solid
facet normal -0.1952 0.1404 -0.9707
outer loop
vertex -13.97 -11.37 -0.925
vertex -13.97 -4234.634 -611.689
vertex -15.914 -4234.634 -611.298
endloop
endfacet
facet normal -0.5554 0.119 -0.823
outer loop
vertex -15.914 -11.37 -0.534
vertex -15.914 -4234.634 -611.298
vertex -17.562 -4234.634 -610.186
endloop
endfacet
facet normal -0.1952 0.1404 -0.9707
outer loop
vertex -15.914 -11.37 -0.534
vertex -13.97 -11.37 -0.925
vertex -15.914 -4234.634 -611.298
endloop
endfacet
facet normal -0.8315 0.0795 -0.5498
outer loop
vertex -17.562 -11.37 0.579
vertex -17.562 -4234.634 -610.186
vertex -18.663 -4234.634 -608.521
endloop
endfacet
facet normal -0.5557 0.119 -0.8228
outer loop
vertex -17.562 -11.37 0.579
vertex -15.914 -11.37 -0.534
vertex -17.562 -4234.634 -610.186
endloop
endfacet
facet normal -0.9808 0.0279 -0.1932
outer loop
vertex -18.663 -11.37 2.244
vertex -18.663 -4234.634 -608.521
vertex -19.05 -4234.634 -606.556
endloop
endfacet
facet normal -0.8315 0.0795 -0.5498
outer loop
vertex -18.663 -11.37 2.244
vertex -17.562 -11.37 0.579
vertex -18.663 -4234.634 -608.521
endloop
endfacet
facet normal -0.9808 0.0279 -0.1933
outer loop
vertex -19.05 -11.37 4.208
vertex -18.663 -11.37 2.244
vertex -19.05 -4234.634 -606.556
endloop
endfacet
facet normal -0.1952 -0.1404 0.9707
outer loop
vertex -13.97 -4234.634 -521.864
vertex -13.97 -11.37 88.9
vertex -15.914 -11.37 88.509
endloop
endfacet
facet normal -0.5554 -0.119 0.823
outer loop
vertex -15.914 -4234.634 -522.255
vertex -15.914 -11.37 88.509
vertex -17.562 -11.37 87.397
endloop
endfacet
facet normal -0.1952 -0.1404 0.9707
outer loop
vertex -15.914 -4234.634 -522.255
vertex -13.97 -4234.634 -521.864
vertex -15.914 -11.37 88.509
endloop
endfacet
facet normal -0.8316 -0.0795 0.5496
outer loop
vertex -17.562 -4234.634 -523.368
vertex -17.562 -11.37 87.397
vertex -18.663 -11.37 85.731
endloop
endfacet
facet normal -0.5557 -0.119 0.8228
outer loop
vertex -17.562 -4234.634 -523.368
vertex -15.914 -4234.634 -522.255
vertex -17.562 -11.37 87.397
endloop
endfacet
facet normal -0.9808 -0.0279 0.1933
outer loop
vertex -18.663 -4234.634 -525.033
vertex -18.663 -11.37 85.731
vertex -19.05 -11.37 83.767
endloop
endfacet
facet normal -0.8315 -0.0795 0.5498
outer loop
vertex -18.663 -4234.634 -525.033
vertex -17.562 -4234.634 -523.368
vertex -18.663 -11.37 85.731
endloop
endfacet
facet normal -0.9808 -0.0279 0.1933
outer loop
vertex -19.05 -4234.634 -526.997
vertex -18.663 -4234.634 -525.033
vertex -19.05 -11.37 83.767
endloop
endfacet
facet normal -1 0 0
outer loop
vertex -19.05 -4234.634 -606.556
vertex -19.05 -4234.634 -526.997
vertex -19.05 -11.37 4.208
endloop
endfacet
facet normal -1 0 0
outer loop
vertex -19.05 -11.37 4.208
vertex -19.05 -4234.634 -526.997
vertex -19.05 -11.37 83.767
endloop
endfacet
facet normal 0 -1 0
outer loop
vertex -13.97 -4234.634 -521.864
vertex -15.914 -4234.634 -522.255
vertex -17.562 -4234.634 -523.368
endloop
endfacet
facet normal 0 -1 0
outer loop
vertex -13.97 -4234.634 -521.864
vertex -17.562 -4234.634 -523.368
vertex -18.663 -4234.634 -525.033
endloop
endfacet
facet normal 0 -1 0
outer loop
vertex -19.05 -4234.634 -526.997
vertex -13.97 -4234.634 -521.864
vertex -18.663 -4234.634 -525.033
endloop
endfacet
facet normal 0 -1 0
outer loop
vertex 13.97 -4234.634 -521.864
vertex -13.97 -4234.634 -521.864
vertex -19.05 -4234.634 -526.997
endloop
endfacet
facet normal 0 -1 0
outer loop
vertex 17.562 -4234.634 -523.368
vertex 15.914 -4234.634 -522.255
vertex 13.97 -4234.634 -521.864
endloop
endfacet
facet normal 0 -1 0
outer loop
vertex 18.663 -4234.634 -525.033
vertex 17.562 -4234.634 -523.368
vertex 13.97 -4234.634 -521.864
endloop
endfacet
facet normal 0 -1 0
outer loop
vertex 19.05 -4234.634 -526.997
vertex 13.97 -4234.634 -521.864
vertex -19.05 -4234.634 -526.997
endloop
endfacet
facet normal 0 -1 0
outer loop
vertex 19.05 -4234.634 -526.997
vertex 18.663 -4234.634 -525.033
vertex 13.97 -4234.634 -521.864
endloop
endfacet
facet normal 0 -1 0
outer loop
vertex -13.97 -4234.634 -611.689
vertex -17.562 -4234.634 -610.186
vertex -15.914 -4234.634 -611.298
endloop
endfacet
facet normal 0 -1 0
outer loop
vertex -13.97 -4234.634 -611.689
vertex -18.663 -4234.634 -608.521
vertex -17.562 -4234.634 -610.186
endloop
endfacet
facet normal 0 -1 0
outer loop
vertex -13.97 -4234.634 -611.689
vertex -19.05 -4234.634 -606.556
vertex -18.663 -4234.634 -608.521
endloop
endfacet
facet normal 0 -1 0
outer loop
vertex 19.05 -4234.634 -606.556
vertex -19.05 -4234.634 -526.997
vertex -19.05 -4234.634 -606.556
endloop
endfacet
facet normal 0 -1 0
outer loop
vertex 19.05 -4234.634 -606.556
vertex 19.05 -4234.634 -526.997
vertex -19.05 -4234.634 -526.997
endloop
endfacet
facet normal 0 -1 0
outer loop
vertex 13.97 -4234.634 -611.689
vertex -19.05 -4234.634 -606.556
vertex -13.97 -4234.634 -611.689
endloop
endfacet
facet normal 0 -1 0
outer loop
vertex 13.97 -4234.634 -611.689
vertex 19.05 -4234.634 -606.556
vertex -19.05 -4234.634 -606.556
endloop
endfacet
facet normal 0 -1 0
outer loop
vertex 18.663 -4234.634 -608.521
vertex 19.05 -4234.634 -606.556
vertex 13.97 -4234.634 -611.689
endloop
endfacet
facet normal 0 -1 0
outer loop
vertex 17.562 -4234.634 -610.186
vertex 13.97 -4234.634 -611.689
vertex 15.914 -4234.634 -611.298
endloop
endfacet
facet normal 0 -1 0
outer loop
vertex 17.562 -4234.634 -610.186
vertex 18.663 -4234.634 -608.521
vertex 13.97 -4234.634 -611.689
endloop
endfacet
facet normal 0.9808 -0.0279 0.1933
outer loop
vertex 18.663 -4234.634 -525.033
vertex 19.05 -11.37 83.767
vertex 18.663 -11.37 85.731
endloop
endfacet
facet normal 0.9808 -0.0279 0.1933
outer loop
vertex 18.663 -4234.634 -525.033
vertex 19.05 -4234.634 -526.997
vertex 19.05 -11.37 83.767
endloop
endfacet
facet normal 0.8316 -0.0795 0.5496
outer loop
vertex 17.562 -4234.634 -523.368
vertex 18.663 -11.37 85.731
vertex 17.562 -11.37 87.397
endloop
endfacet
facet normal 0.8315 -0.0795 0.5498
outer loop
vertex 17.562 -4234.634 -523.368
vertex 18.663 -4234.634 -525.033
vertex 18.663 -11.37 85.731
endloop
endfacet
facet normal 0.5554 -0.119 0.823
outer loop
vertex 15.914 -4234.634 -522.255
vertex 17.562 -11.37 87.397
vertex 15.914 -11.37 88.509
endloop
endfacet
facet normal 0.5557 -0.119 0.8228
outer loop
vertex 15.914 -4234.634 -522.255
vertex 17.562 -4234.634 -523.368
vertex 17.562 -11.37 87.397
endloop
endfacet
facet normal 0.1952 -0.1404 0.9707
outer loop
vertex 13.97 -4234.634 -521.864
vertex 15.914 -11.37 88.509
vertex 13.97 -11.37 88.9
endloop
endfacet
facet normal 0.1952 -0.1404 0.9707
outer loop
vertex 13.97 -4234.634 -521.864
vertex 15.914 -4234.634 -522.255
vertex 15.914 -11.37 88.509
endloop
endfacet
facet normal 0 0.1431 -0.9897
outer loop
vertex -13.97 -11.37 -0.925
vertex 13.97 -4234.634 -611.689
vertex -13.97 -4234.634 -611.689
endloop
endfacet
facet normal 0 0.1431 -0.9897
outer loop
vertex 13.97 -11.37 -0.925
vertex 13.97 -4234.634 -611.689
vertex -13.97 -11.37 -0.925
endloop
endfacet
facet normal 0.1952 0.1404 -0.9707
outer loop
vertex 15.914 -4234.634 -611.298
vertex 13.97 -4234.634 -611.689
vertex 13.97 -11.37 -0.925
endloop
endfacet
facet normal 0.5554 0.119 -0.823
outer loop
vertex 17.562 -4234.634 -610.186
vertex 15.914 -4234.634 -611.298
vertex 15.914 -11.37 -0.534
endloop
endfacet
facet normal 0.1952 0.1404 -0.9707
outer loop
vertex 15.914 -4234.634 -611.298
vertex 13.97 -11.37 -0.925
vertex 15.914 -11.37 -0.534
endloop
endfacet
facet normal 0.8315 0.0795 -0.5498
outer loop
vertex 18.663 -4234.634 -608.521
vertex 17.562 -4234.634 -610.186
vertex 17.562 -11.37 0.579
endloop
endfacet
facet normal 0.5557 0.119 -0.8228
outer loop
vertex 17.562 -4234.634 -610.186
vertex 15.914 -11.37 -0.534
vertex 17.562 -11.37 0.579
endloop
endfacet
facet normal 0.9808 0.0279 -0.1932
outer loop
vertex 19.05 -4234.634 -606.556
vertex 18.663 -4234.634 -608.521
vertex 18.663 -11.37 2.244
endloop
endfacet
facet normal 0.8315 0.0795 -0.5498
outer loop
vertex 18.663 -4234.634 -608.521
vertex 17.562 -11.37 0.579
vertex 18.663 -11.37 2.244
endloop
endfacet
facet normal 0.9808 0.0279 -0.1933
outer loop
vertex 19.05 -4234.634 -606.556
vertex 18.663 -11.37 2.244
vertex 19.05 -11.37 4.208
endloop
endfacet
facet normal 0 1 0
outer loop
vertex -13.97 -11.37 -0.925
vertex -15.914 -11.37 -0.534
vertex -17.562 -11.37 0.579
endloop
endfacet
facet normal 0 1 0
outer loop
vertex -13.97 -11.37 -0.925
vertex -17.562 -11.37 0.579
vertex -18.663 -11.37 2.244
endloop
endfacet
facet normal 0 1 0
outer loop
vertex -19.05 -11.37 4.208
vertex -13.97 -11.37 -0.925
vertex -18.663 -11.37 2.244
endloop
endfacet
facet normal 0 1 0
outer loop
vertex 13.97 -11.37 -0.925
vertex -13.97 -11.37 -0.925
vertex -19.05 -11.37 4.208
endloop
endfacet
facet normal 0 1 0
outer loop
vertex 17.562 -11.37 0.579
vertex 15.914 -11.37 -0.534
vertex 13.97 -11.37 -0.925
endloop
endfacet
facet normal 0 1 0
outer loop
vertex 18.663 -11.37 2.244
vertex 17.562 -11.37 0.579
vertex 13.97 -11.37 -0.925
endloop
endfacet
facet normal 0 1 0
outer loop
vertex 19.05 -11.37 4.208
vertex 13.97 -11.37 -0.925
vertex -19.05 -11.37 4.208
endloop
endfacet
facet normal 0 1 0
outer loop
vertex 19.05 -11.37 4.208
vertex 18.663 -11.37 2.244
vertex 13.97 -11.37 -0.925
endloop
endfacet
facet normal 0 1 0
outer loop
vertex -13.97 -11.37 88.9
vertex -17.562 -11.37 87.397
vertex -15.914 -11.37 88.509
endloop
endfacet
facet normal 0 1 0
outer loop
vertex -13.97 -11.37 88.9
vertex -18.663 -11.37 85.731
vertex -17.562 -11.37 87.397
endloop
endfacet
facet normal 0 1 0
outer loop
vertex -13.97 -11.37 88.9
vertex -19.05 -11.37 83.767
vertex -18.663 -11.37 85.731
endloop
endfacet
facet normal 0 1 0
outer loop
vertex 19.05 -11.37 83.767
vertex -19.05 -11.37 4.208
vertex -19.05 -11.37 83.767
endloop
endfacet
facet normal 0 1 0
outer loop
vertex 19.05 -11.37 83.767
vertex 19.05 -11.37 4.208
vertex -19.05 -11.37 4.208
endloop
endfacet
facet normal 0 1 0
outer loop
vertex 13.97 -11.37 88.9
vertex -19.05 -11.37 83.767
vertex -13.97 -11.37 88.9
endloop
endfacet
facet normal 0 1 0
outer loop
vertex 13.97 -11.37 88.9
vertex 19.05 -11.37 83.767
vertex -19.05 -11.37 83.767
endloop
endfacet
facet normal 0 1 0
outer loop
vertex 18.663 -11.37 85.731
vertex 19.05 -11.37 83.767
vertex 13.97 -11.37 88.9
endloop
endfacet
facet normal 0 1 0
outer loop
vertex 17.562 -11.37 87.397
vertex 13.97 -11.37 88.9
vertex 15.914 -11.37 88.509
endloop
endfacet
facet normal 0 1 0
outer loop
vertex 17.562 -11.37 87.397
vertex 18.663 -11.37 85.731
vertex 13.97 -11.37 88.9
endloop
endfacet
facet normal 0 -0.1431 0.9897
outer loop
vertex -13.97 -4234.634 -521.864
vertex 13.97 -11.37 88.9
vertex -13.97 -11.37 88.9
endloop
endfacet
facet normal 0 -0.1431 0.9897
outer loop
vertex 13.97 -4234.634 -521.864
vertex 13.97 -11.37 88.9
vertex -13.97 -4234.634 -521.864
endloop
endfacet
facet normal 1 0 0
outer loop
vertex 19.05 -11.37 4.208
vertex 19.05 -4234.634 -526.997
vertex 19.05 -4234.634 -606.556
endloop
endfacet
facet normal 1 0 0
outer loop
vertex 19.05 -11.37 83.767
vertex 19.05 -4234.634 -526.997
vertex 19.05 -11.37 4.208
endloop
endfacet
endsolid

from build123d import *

# Parameters (mm, degrees)
F1_DEPTH = 19.05
F2_R     = 5.08


with BuildPart() as f1:
    # F0 (on Right) → F1 (new body, symmetric)
    with BuildSketch(Plane.YZ):
        Polygon((-11.369848, -0.924846), (-11.369848, 88.9), (-4234.634322, -521.864292), (-4234.634322, -611.689138), align=None)
    extrude(amount=F1_DEPTH, both=True)

    # F2
    f2_edges = [f1.edges().sort_by_distance(p)[0] for p in [
        (19.05, -2123.002085, -216.482146),
        (-19.05, -2123.002085, -216.482146),
        (19.05, -2123.002085, -306.306992),
        (-19.05, -2123.002085, -306.306992),
    ]]
    fillet(f2_edges, radius=F2_R)


solid = f1.part
